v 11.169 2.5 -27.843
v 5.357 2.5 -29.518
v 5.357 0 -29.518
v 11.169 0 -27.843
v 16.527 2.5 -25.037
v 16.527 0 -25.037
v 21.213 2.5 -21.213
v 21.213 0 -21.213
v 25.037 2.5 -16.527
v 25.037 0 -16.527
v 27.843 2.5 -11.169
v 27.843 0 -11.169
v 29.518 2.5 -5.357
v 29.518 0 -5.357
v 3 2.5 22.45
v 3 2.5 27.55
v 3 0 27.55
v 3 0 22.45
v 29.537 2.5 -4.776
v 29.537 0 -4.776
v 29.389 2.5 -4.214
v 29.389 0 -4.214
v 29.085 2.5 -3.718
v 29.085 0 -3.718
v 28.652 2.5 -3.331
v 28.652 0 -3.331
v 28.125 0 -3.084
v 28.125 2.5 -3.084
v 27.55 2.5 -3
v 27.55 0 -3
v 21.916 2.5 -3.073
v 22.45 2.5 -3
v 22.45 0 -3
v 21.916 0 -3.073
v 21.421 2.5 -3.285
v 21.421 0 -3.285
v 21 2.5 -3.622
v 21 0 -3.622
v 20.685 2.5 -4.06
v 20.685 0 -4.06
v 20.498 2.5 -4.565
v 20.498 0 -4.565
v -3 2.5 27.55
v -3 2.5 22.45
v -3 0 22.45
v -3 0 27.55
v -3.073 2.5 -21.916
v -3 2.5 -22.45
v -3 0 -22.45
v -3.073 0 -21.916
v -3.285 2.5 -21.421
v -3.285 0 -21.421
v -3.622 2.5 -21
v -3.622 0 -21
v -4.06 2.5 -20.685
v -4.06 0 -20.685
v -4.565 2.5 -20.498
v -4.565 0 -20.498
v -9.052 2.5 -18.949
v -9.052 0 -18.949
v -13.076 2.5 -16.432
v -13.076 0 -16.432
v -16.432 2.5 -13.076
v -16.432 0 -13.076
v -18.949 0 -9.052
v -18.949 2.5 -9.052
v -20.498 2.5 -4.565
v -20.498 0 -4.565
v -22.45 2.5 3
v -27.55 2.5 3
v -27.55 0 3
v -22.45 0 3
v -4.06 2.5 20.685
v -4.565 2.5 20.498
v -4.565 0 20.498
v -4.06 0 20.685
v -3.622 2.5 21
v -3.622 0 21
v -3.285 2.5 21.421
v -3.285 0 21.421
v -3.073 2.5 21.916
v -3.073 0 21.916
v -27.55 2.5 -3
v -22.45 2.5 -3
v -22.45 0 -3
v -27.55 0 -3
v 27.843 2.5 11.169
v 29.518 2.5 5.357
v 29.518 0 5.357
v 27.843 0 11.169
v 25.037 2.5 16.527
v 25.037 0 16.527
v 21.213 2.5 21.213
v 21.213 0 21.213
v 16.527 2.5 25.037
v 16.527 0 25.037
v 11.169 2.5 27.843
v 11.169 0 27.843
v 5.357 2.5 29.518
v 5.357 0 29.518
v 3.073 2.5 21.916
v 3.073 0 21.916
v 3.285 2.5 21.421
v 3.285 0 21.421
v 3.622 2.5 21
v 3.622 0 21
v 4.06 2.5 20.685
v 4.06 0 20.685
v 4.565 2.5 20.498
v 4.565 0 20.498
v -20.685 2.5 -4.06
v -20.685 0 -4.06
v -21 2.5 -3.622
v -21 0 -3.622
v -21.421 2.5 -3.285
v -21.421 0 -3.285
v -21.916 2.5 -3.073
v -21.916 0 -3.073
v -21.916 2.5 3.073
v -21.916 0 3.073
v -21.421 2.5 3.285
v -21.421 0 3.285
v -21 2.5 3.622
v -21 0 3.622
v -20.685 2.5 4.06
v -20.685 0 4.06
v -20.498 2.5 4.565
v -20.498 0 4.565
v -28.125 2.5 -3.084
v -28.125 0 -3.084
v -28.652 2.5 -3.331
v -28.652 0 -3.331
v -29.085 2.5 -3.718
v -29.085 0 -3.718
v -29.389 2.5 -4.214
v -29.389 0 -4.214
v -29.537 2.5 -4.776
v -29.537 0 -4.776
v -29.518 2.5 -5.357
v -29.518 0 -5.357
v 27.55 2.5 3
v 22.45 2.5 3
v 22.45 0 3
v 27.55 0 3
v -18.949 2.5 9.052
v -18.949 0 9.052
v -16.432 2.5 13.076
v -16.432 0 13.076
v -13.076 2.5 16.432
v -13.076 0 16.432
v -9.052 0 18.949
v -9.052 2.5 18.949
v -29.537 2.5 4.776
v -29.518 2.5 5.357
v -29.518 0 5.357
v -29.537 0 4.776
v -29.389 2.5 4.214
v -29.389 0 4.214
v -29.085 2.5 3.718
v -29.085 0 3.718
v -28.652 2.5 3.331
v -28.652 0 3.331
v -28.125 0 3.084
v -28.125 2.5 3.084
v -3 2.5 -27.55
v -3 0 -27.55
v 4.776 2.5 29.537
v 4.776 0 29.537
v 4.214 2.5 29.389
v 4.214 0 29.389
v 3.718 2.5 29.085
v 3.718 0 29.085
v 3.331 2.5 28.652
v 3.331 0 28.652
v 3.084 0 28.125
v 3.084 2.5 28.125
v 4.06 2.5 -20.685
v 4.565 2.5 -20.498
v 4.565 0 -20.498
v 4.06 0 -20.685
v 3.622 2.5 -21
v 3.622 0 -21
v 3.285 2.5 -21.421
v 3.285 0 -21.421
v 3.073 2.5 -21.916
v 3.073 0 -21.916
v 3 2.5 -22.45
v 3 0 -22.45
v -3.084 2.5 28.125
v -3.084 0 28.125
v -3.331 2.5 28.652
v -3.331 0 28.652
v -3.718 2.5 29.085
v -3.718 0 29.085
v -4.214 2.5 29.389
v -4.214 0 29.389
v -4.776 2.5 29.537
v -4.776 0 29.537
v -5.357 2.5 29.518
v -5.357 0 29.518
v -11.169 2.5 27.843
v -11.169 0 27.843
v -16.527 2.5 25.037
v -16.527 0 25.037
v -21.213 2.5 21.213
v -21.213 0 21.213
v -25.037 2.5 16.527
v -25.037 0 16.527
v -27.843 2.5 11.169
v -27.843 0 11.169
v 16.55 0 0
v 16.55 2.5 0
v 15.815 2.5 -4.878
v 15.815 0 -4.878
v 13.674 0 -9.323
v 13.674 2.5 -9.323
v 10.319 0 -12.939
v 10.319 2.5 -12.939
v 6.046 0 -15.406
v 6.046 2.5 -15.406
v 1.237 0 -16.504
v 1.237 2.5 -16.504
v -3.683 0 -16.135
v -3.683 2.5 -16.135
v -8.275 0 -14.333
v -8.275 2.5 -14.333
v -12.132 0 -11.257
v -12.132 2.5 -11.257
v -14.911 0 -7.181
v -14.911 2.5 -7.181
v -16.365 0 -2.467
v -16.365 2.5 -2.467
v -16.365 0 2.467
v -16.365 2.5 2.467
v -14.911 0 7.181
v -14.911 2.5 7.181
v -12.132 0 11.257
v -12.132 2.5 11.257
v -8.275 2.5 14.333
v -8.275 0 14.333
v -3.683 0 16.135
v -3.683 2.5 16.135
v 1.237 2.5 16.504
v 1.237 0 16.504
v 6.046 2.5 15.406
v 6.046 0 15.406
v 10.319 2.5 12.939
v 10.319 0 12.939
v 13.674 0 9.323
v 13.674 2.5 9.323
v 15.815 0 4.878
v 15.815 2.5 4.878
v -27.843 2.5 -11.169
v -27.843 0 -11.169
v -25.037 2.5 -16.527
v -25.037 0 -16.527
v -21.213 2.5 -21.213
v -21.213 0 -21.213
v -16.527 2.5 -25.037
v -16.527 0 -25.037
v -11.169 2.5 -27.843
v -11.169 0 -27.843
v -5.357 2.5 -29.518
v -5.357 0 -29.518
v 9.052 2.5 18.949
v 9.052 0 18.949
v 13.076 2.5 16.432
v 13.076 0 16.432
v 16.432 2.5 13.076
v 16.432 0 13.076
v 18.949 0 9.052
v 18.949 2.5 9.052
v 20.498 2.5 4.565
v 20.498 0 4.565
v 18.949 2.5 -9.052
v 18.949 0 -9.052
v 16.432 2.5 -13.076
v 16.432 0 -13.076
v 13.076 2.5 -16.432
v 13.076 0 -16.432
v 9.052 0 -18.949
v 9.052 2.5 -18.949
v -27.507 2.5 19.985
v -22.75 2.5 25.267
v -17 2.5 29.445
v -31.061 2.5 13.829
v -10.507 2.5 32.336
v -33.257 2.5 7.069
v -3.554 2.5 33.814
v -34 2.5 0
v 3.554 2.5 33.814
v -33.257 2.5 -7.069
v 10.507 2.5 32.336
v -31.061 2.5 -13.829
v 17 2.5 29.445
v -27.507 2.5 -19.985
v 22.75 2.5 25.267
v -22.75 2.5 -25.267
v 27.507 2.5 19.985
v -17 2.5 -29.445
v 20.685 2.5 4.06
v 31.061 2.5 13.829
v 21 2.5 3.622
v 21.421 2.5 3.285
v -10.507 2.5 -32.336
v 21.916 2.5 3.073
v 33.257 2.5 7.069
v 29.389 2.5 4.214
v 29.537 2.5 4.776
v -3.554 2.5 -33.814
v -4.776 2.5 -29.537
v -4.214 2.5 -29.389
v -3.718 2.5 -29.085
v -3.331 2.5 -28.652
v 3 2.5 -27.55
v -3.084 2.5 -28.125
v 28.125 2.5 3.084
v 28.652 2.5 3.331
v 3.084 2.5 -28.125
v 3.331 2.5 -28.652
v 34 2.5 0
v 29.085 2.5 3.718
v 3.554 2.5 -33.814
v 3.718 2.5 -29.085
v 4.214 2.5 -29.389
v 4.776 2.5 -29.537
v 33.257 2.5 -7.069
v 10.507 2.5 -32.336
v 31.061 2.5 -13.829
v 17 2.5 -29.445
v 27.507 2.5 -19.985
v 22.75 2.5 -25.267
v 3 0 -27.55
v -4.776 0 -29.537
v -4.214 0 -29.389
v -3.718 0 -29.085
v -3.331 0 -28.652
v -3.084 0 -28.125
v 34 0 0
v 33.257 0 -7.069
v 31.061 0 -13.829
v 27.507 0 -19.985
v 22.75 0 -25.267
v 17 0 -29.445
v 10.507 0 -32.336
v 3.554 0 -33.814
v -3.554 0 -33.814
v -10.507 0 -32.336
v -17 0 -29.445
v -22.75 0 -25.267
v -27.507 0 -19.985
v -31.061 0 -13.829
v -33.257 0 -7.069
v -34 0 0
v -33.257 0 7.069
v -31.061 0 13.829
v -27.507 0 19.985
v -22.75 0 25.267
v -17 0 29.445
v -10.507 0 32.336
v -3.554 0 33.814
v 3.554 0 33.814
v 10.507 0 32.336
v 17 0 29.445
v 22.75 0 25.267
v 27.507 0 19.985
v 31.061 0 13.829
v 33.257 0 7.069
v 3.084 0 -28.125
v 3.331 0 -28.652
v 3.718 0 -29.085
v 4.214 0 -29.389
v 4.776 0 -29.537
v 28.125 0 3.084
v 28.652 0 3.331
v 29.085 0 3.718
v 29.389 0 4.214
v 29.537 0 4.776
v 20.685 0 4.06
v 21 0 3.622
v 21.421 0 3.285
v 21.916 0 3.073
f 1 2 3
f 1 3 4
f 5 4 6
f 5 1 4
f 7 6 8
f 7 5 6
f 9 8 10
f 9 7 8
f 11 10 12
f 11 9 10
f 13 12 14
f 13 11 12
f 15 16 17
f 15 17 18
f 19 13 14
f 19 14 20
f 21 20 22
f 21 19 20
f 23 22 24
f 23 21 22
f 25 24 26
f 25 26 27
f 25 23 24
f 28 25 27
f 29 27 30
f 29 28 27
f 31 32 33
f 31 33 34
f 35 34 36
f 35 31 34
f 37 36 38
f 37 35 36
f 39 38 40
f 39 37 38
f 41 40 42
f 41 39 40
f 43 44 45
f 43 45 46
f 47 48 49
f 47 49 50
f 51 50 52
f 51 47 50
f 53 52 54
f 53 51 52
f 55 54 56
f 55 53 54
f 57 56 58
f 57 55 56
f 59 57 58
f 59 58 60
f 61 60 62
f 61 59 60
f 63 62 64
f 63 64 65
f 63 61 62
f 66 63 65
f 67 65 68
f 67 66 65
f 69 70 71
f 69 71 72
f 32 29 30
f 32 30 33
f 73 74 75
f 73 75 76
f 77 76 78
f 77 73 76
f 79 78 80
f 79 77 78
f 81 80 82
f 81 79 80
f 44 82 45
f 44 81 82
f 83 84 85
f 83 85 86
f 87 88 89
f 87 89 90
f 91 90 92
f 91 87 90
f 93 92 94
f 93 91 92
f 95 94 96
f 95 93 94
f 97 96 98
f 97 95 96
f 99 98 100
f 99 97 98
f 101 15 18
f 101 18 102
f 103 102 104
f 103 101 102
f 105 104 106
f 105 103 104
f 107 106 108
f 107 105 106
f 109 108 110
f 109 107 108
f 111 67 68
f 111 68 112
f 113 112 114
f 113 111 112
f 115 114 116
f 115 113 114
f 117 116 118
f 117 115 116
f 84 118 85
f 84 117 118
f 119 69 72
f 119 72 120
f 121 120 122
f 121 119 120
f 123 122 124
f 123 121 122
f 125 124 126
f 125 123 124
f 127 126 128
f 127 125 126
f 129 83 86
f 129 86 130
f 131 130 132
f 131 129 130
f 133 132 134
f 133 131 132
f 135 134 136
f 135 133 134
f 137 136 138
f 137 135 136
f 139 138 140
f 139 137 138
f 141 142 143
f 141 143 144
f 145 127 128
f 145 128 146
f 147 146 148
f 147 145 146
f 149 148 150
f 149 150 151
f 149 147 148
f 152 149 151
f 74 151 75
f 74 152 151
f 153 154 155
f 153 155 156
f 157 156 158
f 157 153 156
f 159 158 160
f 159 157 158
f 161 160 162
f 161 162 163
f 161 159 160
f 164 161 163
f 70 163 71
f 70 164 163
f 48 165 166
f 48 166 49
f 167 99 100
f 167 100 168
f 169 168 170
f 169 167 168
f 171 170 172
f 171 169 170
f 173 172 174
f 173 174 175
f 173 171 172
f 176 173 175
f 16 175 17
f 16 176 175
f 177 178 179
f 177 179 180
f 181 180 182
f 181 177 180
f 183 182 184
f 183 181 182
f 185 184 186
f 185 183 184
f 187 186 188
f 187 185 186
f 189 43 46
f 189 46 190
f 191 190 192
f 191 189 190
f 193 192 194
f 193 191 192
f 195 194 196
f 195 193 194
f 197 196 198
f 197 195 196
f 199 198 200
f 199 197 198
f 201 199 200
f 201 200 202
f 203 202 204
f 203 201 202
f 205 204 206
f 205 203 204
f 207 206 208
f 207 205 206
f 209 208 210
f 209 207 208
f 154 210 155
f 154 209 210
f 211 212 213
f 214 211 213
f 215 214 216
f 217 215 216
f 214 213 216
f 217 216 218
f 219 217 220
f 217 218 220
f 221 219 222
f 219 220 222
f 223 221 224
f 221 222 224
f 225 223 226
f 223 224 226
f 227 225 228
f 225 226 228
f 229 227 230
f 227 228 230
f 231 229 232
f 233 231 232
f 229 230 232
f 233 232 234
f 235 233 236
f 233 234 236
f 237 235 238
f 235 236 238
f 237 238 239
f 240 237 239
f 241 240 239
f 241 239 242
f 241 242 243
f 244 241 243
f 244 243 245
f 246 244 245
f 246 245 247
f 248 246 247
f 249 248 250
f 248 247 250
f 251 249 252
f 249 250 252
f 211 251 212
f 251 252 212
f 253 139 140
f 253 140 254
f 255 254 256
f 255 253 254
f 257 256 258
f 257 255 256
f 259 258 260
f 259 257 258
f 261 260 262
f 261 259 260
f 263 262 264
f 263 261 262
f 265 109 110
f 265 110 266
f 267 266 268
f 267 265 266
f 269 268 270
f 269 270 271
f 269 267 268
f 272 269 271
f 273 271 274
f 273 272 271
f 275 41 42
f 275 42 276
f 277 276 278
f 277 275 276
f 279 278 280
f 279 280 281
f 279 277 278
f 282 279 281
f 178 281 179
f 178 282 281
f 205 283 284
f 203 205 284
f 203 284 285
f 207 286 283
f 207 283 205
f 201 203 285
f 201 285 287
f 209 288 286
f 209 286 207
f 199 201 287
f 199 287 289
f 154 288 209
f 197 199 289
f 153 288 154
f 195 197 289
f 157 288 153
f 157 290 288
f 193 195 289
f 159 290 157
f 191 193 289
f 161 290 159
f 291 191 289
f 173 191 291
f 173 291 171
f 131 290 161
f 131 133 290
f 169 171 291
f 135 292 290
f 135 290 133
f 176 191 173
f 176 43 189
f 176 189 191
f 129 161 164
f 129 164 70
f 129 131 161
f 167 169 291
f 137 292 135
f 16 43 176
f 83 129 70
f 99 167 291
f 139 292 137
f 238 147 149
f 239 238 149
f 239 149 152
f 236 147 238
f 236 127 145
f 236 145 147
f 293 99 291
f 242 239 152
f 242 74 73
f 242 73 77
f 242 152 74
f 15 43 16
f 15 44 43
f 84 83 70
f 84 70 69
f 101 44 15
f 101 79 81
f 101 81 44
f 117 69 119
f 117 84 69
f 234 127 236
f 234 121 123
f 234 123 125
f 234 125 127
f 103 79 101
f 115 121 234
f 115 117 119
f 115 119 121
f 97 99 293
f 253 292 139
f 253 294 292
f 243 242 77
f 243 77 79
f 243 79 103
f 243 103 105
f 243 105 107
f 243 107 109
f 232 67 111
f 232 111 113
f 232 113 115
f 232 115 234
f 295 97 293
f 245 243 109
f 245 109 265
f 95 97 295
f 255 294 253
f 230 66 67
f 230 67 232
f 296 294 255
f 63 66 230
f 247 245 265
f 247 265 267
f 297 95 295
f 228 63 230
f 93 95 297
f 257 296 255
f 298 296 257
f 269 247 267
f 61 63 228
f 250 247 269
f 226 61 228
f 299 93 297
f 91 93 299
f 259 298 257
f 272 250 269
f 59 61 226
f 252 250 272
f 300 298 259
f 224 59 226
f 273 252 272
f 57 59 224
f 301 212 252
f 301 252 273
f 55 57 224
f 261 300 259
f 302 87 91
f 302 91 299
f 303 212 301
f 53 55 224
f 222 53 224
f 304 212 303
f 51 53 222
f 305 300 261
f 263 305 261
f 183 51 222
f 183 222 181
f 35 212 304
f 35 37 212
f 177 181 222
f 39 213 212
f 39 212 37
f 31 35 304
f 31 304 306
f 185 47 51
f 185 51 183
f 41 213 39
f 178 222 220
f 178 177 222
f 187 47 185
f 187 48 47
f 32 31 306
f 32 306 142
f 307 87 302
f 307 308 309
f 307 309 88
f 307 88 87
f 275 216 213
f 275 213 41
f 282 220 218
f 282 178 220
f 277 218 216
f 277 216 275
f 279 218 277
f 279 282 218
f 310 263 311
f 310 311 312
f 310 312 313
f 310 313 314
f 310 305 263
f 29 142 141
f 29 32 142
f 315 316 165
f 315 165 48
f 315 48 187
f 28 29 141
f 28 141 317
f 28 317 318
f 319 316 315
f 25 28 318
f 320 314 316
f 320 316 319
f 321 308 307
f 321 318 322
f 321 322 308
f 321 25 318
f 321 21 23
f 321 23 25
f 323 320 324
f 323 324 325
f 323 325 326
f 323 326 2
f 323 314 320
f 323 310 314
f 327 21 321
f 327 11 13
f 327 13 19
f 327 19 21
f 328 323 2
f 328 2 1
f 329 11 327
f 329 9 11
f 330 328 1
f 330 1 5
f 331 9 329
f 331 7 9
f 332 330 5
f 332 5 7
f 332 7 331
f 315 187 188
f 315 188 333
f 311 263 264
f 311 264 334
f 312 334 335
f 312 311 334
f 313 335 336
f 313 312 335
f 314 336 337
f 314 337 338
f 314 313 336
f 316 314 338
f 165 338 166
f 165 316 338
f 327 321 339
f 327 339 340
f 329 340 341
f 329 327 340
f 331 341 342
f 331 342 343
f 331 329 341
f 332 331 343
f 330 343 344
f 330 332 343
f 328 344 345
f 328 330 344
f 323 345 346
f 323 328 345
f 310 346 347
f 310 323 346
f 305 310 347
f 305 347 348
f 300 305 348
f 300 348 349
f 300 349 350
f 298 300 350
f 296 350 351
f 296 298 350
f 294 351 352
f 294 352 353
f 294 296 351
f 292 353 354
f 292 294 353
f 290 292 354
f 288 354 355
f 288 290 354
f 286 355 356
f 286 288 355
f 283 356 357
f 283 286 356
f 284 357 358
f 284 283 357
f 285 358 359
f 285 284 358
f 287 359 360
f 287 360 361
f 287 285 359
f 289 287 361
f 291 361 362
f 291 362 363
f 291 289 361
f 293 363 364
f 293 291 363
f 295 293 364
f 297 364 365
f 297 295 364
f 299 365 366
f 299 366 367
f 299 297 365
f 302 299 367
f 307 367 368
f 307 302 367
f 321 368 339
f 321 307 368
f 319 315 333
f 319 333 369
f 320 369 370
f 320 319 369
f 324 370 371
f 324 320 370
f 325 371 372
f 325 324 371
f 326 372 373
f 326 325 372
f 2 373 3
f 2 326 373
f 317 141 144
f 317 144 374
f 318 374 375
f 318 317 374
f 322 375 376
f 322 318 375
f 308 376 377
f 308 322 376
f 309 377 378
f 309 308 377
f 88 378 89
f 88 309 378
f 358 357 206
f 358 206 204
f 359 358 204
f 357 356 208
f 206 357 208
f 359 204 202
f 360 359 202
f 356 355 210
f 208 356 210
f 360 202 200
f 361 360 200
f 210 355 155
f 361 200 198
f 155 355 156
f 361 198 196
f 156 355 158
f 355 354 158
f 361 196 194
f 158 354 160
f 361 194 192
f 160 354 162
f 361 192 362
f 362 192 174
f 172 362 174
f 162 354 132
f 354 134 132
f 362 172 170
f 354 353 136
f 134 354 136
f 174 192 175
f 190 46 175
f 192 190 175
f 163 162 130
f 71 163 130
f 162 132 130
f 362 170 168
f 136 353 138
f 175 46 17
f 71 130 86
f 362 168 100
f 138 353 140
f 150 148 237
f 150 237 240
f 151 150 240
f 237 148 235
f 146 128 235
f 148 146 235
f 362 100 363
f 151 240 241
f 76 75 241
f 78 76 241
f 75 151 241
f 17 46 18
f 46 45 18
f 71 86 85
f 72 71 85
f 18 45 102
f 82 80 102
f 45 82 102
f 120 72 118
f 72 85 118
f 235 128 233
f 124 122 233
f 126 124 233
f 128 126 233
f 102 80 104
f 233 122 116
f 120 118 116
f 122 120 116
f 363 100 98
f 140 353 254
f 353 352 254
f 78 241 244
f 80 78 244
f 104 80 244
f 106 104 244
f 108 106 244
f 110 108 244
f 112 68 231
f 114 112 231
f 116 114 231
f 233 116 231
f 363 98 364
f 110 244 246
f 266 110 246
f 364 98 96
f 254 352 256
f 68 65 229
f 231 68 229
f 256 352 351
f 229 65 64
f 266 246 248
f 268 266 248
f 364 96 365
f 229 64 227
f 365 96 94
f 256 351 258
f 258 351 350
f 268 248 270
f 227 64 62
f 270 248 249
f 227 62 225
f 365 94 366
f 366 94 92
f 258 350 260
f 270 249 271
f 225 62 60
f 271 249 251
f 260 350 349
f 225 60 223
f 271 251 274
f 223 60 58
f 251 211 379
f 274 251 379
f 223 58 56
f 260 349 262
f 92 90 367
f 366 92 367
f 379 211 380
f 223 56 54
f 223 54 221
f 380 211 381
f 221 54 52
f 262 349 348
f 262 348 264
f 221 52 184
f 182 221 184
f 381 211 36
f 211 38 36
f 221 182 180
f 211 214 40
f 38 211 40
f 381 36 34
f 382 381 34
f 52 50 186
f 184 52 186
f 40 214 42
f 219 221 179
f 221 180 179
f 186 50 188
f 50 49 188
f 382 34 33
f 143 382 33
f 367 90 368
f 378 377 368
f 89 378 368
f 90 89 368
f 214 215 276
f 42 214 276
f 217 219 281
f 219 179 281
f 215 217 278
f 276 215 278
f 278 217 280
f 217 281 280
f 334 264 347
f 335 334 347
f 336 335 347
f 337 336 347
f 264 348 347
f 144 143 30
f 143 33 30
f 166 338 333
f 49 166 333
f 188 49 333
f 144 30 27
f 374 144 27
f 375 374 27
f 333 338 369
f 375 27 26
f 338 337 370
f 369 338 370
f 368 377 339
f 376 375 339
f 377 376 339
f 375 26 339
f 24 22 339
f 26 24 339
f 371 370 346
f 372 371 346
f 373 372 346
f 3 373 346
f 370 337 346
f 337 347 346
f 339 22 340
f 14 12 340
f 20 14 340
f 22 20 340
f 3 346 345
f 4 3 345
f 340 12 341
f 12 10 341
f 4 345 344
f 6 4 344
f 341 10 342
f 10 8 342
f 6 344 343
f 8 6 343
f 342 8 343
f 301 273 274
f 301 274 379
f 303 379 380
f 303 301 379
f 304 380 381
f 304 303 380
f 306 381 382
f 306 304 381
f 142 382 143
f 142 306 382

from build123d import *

# Parameters (mm, degrees)
SKETCH_1_R      = 34
SKETCH_1_R_2    = 16.55
EXTRUDE_1_DEPTH = 2.5


with BuildPart() as part:
    # 草图1 → 凸台-拉伸1 (new body)
    with BuildSketch(Plane(origin=(0, 2.5, 0), x_dir=(1, 0, 0), z_dir=(0, 1, 0))):
        Circle(SKETCH_1_R)
        Circle(SKETCH_1_R_2, mode=Mode.SUBTRACT)
        with BuildLine():
            Line((-3, -22.449944321), (-3, -27.549954628))
            ThreePointArc((-3, -27.549954628), (-3.718260111, -29.085253575), (-5.357142857, -29.51780853))
            ThreePointArc((-5.357142857, -29.51780853), (-21.213203436, -21.213203436), (-29.51780853, -5.357142857))
            ThreePointArc((-29.51780853, -5.357142857), (-29.085253575, -3.718260111), (-27.549954628, -3))
            Line((-27.549954628, -3), (-22.449944321, -3))
            ThreePointArc((-22.449944321, -3), (-21.198857836, -3.439621005), (-20.497775249, -4.565217391))
            ThreePointArc((-20.497775249, -4.565217391), (-14.849242405, -14.849242405), (-4.565217391, -20.497775249))
            ThreePointArc((-4.565217391, -20.497775249), (-3.439621005, -21.198857836), (-3, -22.449944321))
        make_face(mode=Mode.SUBTRACT)
        with BuildLine():
            Line((-22.449944321, 3), (-27.549954628, 3))
            ThreePointArc((-27.549954628, 3), (-29.085253575, 3.718260111), (-29.51780853, 5.357142857))
            ThreePointArc((-29.51780853, 5.357142857), (-21.213203436, 21.213203436), (-5.357142857, 29.51780853))
            ThreePointArc((-5.357142857, 29.51780853), (-3.718260111, 29.085253575), (-3, 27.549954628))
            Line((-3, 27.549954628), (-3, 22.449944321))
            ThreePointArc((-3, 22.449944321), (-3.439621005, 21.198857836), (-4.565217391, 20.497775249))
            ThreePointArc((-4.565217391, 20.497775249), (-14.849242405, 14.849242405), (-20.497775249, 4.565217391))
            ThreePointArc((-20.497775249, 4.565217391), (-21.198857836, 3.439621005), (-22.449944321, 3))
        make_face(mode=Mode.SUBTRACT)
        with BuildLine():
            Line((3, 22.449944321), (3, 27.549954628))
            ThreePointArc((3, 27.549954628), (3.718260111, 29.085253575), (5.357142857, 29.51780853))
            ThreePointArc((5.357142857, 29.51780853), (21.213203436, 21.213203436), (29.51780853, 5.357142857))
            ThreePointArc((29.51780853, 5.357142857), (29.085253575, 3.718260111), (27.549954628, 3))
            Line((27.549954628, 3), (22.449944321, 3))
            ThreePointArc((22.449944321, 3), (21.198857836, 3.439621005), (20.497775249, 4.565217391))
            ThreePointArc((20.497775249, 4.565217391), (14.849242405, 14.849242405), (4.565217391, 20.497775249))
            ThreePointArc((4.565217391, 20.497775249), (3.439621005, 21.198857836), (3, 22.449944321))
        make_face(mode=Mode.SUBTRACT)
        with BuildLine():
            Line((22.449944321, -3), (27.549954628, -3))
            ThreePointArc((27.549954628, -3), (29.085253575, -3.718260111), (29.51780853, -5.357142857))
            ThreePointArc((29.51780853, -5.357142857), (21.213203436, -21.213203436), (5.357142857, -29.51780853))
            ThreePointArc((5.357142857, -29.51780853), (3.718260111, -29.085253575), (3, -27.549954628))
            Line((3, -27.549954628), (3, -22.449944321))
            ThreePointArc((3, -22.449944321), (3.439621005, -21.198857836), (4.565217391, -20.497775249))
            ThreePointArc((4.565217391, -20.497775249), (14.849242405, -14.849242405), (20.497775249, -4.565217391))
            ThreePointArc((20.497775249, -4.565217391), (21.198857836, -3.439621005), (22.449944321, -3))
        make_face(mode=Mode.SUBTRACT)
    extrude(amount=-EXTRUDE_1_DEPTH)


solid = part.part
